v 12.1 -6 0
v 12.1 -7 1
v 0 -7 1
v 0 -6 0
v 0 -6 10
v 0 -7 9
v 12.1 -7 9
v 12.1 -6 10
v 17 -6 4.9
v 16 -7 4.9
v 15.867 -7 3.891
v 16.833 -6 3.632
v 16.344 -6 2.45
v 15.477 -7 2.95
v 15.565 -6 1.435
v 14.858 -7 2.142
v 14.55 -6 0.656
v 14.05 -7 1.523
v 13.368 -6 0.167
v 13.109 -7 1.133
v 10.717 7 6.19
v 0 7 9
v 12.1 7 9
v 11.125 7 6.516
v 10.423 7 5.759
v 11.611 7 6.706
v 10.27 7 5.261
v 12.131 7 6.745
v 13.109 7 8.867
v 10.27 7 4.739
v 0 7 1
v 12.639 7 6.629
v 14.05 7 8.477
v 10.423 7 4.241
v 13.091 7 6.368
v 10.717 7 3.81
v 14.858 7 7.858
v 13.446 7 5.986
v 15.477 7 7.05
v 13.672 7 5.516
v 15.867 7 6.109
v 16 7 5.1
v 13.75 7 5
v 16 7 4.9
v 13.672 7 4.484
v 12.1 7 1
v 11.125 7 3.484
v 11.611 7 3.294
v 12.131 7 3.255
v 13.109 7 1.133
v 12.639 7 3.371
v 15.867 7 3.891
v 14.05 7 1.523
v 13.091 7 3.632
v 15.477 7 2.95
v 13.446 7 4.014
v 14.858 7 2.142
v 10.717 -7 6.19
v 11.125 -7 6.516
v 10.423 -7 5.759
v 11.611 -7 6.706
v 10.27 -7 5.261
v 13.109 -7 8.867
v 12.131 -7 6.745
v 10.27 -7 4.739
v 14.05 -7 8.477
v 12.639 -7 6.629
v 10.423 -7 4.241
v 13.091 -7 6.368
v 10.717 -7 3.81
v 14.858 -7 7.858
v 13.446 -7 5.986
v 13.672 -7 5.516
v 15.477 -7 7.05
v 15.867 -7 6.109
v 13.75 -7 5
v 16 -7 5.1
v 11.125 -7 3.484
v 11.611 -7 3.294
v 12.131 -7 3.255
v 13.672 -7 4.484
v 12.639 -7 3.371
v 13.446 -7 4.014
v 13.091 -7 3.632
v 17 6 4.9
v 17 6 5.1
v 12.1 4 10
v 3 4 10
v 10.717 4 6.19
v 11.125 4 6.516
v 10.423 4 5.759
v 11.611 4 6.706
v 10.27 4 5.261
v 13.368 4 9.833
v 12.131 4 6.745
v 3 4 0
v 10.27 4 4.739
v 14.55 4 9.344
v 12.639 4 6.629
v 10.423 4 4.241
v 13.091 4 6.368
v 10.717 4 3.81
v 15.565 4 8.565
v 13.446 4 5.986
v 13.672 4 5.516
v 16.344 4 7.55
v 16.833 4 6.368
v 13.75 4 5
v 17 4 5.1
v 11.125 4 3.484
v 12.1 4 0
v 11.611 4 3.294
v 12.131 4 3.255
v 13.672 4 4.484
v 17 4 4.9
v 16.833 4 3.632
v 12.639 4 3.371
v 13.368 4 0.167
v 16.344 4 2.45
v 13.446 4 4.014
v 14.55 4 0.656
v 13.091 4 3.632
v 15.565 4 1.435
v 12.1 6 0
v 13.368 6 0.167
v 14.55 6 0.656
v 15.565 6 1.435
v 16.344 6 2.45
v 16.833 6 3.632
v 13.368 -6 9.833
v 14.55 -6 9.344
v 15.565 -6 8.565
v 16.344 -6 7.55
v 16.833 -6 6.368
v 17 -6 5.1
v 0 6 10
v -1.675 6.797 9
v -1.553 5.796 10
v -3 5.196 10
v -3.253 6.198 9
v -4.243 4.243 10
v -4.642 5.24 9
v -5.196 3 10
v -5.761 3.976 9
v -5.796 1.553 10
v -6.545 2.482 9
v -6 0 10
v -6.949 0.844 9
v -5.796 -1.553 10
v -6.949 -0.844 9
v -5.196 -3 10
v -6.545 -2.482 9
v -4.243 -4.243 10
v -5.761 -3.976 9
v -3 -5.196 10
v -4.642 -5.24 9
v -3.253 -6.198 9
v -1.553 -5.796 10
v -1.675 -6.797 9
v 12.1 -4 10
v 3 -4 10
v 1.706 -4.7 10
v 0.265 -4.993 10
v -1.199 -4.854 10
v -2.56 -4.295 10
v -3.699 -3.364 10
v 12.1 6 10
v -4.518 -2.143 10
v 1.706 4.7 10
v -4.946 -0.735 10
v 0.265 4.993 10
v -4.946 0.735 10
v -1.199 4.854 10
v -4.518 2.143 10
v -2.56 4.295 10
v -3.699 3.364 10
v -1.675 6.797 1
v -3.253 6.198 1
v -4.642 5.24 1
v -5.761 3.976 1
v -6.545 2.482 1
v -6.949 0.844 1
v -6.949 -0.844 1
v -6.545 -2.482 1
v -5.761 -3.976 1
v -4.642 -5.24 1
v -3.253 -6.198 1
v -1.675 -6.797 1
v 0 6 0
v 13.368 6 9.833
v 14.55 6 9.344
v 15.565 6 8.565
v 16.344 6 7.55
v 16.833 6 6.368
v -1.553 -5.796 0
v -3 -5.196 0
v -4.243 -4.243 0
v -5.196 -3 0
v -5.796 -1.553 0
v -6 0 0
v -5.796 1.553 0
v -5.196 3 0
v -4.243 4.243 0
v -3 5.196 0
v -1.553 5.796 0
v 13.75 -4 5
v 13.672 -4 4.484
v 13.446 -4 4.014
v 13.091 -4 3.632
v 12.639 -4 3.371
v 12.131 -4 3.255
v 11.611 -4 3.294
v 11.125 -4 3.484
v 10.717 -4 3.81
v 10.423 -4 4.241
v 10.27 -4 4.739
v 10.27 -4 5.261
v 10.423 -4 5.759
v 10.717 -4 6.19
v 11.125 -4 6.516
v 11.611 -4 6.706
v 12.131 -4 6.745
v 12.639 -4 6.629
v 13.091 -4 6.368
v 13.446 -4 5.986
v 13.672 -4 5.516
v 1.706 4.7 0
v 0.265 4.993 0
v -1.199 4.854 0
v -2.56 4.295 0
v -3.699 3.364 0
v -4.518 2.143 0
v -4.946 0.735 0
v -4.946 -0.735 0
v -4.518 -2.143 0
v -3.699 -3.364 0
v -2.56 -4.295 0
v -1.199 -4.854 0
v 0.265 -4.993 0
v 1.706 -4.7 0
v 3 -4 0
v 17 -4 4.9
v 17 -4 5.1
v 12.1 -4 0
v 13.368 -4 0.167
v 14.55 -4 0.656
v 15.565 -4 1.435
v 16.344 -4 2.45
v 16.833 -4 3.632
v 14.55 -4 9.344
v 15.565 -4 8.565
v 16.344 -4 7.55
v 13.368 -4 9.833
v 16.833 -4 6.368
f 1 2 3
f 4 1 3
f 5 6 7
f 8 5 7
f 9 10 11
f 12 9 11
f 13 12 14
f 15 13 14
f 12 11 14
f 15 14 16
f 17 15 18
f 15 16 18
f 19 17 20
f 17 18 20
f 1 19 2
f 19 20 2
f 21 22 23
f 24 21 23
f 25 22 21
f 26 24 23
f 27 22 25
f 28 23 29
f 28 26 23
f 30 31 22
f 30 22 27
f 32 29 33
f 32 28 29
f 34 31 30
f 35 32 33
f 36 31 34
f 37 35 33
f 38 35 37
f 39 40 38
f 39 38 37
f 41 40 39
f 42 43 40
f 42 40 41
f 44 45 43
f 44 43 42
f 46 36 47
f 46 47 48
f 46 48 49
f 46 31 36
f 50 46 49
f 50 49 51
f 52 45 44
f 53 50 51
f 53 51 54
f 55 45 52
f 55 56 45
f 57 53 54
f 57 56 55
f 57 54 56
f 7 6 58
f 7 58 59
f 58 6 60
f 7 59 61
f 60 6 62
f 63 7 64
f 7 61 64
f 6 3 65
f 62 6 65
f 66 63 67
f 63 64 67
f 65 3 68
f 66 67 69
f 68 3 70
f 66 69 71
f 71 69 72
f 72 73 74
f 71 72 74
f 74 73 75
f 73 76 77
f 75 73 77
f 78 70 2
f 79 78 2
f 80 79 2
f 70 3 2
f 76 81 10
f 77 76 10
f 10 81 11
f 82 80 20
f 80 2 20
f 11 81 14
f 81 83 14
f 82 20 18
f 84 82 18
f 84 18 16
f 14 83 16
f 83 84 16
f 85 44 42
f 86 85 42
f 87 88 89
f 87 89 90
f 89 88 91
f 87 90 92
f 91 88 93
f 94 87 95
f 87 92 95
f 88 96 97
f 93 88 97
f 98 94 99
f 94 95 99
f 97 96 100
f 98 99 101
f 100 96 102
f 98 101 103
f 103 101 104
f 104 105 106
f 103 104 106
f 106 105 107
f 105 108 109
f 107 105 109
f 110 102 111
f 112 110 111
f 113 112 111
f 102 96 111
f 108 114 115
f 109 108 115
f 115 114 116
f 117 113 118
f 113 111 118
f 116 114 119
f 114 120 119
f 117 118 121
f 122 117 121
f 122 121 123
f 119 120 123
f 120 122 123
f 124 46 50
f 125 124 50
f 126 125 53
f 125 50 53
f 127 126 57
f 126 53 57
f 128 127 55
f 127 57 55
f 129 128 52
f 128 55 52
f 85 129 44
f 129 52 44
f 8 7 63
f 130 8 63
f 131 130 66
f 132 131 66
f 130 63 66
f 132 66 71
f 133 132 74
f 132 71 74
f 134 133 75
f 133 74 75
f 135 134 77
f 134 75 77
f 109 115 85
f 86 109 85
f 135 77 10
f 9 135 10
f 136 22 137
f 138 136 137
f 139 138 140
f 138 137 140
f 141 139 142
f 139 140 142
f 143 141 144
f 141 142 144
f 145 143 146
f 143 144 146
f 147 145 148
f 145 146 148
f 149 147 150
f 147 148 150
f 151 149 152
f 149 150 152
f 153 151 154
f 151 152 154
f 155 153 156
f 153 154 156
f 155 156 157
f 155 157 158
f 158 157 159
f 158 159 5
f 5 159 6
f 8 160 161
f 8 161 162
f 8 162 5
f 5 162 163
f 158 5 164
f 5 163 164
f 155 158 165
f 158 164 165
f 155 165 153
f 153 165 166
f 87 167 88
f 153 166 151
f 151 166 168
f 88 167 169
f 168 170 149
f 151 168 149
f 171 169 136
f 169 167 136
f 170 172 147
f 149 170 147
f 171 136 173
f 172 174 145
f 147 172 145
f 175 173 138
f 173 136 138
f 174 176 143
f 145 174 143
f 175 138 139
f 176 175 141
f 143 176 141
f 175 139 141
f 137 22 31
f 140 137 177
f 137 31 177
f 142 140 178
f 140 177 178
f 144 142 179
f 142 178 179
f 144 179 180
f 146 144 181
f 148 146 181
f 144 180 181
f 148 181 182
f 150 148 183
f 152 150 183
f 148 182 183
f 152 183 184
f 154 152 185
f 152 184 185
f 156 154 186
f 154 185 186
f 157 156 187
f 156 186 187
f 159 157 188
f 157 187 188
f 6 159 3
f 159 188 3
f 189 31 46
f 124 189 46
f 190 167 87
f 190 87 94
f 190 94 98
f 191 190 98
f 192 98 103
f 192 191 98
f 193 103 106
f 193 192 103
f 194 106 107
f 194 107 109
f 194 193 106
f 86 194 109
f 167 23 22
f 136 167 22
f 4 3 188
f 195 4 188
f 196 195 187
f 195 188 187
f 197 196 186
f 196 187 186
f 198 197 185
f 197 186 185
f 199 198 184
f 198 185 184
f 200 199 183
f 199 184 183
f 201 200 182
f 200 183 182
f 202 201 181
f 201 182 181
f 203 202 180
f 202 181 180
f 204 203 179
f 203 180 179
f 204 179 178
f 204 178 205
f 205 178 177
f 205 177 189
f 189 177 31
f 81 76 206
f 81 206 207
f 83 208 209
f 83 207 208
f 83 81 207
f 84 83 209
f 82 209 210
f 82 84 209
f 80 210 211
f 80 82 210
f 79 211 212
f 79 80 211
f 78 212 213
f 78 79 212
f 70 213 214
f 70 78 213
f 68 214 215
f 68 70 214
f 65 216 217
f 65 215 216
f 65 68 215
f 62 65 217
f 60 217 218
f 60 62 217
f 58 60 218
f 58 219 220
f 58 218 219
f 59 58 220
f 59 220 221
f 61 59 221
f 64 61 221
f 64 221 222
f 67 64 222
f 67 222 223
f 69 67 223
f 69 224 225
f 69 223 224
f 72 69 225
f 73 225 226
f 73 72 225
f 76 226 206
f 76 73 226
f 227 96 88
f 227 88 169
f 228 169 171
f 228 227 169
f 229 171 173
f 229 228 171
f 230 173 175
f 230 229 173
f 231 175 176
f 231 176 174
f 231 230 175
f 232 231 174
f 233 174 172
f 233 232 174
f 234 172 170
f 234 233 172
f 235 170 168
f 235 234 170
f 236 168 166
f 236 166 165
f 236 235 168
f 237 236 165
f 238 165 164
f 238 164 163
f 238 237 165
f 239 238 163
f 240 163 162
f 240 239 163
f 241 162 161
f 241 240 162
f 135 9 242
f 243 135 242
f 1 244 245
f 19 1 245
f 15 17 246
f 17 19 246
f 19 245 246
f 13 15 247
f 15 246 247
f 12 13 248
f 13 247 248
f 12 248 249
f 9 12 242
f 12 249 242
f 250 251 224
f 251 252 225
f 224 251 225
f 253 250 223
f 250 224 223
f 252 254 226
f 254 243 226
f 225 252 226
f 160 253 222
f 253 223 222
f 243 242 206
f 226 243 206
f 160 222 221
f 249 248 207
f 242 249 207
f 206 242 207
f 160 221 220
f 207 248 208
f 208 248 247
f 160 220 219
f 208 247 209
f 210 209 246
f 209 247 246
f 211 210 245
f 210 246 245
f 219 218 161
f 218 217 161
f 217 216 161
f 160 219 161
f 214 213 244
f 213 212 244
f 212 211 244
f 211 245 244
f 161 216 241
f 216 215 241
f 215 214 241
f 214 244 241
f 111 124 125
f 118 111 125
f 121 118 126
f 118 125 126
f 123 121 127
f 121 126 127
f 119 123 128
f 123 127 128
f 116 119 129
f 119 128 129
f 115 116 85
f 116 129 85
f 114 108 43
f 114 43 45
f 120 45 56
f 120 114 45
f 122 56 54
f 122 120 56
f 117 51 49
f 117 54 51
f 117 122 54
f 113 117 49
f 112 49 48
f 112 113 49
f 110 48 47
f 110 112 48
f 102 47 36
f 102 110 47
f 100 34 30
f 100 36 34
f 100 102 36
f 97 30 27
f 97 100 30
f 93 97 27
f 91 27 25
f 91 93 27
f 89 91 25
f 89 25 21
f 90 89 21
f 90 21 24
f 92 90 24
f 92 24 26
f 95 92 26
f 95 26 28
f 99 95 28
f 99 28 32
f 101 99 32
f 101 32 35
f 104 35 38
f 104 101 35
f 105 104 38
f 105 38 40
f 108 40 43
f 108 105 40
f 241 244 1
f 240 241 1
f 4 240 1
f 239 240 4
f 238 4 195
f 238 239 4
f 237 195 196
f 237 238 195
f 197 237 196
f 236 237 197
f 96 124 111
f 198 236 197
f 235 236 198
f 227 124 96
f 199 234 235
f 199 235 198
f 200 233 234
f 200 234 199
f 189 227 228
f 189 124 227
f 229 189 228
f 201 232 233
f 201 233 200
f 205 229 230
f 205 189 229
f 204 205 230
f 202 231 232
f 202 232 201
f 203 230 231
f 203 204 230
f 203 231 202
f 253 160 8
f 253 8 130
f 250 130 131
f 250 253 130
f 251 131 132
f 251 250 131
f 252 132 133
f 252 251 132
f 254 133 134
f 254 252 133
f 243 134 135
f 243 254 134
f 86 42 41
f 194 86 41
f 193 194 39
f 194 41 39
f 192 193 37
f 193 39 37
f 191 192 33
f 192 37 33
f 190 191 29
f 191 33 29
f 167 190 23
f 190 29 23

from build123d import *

# Parameters (mm, degrees)
CYLINDER_R          = 1.75
CYLINDER_DEPTH      = 20
CYLINDER_ROLL_ANGLE = -90
PAD006_DEPTH        = 10
FILLET_R            = 4.9
CHAMFER_SIZE        = 1


with BuildPart() as cylinder:
    # Cylinder → Cylinder (new body)
    with BuildSketch(Plane.XY):
        Circle(CYLINDER_R)
    extrude(amount=CYLINDER_DEPTH)


with BuildPart() as cylinder_1:
    # Cylinder roll: moved
    add(cylinder.part.rotate(Axis((0, 0, 0), (1, 0, 0)), CYLINDER_ROLL_ANGLE))


with BuildPart() as cylinder_2:
    # Cylinder placement: moved
    add(cylinder_1.part.moved(Location((12, -10, 5))))


with BuildPart() as chamfer_body:
    # Sketch005 → Pad006 (new body)
    with BuildSketch(Plane.XY):
        with BuildLine():
            ThreePointArc((3, 4), (-5, 0), (3, -4))
            Line((17, -4), (3, -4))
            Line((17, -7), (17, -4))
            Line((0, -7), (17, -7))
            ThreePointArc((0, 7), (-7, 0), (0, -7))
            Line((0, 7), (17, 7))
            Line((17, 4), (17, 7))
            Line((3, 4), (17, 4))
        make_face()
    extrude(amount=PAD006_DEPTH)

    # Cut004: cut Cylinder
    add(cylinder_2.part, mode=Mode.SUBTRACT)

    # Fillet
    fillet_edges = [chamfer_body.edges().sort_by_distance(p)[0] for p in [
        (17, -5.5, 0),
        (17, 5.5, 0),
        (17, -5.5, 10),
        (17, 5.5, 10),
    ]]
    fillet(fillet_edges, radius=FILLET_R)

    # Chamfer
    chamfer_edges = [chamfer_body.edges().sort_by_distance(p)[0] for p in [
        (6.05, -7, 10),
    ]]
    chamfer(chamfer_edges, length=CHAMFER_SIZE)


solid = chamfer_body.part
